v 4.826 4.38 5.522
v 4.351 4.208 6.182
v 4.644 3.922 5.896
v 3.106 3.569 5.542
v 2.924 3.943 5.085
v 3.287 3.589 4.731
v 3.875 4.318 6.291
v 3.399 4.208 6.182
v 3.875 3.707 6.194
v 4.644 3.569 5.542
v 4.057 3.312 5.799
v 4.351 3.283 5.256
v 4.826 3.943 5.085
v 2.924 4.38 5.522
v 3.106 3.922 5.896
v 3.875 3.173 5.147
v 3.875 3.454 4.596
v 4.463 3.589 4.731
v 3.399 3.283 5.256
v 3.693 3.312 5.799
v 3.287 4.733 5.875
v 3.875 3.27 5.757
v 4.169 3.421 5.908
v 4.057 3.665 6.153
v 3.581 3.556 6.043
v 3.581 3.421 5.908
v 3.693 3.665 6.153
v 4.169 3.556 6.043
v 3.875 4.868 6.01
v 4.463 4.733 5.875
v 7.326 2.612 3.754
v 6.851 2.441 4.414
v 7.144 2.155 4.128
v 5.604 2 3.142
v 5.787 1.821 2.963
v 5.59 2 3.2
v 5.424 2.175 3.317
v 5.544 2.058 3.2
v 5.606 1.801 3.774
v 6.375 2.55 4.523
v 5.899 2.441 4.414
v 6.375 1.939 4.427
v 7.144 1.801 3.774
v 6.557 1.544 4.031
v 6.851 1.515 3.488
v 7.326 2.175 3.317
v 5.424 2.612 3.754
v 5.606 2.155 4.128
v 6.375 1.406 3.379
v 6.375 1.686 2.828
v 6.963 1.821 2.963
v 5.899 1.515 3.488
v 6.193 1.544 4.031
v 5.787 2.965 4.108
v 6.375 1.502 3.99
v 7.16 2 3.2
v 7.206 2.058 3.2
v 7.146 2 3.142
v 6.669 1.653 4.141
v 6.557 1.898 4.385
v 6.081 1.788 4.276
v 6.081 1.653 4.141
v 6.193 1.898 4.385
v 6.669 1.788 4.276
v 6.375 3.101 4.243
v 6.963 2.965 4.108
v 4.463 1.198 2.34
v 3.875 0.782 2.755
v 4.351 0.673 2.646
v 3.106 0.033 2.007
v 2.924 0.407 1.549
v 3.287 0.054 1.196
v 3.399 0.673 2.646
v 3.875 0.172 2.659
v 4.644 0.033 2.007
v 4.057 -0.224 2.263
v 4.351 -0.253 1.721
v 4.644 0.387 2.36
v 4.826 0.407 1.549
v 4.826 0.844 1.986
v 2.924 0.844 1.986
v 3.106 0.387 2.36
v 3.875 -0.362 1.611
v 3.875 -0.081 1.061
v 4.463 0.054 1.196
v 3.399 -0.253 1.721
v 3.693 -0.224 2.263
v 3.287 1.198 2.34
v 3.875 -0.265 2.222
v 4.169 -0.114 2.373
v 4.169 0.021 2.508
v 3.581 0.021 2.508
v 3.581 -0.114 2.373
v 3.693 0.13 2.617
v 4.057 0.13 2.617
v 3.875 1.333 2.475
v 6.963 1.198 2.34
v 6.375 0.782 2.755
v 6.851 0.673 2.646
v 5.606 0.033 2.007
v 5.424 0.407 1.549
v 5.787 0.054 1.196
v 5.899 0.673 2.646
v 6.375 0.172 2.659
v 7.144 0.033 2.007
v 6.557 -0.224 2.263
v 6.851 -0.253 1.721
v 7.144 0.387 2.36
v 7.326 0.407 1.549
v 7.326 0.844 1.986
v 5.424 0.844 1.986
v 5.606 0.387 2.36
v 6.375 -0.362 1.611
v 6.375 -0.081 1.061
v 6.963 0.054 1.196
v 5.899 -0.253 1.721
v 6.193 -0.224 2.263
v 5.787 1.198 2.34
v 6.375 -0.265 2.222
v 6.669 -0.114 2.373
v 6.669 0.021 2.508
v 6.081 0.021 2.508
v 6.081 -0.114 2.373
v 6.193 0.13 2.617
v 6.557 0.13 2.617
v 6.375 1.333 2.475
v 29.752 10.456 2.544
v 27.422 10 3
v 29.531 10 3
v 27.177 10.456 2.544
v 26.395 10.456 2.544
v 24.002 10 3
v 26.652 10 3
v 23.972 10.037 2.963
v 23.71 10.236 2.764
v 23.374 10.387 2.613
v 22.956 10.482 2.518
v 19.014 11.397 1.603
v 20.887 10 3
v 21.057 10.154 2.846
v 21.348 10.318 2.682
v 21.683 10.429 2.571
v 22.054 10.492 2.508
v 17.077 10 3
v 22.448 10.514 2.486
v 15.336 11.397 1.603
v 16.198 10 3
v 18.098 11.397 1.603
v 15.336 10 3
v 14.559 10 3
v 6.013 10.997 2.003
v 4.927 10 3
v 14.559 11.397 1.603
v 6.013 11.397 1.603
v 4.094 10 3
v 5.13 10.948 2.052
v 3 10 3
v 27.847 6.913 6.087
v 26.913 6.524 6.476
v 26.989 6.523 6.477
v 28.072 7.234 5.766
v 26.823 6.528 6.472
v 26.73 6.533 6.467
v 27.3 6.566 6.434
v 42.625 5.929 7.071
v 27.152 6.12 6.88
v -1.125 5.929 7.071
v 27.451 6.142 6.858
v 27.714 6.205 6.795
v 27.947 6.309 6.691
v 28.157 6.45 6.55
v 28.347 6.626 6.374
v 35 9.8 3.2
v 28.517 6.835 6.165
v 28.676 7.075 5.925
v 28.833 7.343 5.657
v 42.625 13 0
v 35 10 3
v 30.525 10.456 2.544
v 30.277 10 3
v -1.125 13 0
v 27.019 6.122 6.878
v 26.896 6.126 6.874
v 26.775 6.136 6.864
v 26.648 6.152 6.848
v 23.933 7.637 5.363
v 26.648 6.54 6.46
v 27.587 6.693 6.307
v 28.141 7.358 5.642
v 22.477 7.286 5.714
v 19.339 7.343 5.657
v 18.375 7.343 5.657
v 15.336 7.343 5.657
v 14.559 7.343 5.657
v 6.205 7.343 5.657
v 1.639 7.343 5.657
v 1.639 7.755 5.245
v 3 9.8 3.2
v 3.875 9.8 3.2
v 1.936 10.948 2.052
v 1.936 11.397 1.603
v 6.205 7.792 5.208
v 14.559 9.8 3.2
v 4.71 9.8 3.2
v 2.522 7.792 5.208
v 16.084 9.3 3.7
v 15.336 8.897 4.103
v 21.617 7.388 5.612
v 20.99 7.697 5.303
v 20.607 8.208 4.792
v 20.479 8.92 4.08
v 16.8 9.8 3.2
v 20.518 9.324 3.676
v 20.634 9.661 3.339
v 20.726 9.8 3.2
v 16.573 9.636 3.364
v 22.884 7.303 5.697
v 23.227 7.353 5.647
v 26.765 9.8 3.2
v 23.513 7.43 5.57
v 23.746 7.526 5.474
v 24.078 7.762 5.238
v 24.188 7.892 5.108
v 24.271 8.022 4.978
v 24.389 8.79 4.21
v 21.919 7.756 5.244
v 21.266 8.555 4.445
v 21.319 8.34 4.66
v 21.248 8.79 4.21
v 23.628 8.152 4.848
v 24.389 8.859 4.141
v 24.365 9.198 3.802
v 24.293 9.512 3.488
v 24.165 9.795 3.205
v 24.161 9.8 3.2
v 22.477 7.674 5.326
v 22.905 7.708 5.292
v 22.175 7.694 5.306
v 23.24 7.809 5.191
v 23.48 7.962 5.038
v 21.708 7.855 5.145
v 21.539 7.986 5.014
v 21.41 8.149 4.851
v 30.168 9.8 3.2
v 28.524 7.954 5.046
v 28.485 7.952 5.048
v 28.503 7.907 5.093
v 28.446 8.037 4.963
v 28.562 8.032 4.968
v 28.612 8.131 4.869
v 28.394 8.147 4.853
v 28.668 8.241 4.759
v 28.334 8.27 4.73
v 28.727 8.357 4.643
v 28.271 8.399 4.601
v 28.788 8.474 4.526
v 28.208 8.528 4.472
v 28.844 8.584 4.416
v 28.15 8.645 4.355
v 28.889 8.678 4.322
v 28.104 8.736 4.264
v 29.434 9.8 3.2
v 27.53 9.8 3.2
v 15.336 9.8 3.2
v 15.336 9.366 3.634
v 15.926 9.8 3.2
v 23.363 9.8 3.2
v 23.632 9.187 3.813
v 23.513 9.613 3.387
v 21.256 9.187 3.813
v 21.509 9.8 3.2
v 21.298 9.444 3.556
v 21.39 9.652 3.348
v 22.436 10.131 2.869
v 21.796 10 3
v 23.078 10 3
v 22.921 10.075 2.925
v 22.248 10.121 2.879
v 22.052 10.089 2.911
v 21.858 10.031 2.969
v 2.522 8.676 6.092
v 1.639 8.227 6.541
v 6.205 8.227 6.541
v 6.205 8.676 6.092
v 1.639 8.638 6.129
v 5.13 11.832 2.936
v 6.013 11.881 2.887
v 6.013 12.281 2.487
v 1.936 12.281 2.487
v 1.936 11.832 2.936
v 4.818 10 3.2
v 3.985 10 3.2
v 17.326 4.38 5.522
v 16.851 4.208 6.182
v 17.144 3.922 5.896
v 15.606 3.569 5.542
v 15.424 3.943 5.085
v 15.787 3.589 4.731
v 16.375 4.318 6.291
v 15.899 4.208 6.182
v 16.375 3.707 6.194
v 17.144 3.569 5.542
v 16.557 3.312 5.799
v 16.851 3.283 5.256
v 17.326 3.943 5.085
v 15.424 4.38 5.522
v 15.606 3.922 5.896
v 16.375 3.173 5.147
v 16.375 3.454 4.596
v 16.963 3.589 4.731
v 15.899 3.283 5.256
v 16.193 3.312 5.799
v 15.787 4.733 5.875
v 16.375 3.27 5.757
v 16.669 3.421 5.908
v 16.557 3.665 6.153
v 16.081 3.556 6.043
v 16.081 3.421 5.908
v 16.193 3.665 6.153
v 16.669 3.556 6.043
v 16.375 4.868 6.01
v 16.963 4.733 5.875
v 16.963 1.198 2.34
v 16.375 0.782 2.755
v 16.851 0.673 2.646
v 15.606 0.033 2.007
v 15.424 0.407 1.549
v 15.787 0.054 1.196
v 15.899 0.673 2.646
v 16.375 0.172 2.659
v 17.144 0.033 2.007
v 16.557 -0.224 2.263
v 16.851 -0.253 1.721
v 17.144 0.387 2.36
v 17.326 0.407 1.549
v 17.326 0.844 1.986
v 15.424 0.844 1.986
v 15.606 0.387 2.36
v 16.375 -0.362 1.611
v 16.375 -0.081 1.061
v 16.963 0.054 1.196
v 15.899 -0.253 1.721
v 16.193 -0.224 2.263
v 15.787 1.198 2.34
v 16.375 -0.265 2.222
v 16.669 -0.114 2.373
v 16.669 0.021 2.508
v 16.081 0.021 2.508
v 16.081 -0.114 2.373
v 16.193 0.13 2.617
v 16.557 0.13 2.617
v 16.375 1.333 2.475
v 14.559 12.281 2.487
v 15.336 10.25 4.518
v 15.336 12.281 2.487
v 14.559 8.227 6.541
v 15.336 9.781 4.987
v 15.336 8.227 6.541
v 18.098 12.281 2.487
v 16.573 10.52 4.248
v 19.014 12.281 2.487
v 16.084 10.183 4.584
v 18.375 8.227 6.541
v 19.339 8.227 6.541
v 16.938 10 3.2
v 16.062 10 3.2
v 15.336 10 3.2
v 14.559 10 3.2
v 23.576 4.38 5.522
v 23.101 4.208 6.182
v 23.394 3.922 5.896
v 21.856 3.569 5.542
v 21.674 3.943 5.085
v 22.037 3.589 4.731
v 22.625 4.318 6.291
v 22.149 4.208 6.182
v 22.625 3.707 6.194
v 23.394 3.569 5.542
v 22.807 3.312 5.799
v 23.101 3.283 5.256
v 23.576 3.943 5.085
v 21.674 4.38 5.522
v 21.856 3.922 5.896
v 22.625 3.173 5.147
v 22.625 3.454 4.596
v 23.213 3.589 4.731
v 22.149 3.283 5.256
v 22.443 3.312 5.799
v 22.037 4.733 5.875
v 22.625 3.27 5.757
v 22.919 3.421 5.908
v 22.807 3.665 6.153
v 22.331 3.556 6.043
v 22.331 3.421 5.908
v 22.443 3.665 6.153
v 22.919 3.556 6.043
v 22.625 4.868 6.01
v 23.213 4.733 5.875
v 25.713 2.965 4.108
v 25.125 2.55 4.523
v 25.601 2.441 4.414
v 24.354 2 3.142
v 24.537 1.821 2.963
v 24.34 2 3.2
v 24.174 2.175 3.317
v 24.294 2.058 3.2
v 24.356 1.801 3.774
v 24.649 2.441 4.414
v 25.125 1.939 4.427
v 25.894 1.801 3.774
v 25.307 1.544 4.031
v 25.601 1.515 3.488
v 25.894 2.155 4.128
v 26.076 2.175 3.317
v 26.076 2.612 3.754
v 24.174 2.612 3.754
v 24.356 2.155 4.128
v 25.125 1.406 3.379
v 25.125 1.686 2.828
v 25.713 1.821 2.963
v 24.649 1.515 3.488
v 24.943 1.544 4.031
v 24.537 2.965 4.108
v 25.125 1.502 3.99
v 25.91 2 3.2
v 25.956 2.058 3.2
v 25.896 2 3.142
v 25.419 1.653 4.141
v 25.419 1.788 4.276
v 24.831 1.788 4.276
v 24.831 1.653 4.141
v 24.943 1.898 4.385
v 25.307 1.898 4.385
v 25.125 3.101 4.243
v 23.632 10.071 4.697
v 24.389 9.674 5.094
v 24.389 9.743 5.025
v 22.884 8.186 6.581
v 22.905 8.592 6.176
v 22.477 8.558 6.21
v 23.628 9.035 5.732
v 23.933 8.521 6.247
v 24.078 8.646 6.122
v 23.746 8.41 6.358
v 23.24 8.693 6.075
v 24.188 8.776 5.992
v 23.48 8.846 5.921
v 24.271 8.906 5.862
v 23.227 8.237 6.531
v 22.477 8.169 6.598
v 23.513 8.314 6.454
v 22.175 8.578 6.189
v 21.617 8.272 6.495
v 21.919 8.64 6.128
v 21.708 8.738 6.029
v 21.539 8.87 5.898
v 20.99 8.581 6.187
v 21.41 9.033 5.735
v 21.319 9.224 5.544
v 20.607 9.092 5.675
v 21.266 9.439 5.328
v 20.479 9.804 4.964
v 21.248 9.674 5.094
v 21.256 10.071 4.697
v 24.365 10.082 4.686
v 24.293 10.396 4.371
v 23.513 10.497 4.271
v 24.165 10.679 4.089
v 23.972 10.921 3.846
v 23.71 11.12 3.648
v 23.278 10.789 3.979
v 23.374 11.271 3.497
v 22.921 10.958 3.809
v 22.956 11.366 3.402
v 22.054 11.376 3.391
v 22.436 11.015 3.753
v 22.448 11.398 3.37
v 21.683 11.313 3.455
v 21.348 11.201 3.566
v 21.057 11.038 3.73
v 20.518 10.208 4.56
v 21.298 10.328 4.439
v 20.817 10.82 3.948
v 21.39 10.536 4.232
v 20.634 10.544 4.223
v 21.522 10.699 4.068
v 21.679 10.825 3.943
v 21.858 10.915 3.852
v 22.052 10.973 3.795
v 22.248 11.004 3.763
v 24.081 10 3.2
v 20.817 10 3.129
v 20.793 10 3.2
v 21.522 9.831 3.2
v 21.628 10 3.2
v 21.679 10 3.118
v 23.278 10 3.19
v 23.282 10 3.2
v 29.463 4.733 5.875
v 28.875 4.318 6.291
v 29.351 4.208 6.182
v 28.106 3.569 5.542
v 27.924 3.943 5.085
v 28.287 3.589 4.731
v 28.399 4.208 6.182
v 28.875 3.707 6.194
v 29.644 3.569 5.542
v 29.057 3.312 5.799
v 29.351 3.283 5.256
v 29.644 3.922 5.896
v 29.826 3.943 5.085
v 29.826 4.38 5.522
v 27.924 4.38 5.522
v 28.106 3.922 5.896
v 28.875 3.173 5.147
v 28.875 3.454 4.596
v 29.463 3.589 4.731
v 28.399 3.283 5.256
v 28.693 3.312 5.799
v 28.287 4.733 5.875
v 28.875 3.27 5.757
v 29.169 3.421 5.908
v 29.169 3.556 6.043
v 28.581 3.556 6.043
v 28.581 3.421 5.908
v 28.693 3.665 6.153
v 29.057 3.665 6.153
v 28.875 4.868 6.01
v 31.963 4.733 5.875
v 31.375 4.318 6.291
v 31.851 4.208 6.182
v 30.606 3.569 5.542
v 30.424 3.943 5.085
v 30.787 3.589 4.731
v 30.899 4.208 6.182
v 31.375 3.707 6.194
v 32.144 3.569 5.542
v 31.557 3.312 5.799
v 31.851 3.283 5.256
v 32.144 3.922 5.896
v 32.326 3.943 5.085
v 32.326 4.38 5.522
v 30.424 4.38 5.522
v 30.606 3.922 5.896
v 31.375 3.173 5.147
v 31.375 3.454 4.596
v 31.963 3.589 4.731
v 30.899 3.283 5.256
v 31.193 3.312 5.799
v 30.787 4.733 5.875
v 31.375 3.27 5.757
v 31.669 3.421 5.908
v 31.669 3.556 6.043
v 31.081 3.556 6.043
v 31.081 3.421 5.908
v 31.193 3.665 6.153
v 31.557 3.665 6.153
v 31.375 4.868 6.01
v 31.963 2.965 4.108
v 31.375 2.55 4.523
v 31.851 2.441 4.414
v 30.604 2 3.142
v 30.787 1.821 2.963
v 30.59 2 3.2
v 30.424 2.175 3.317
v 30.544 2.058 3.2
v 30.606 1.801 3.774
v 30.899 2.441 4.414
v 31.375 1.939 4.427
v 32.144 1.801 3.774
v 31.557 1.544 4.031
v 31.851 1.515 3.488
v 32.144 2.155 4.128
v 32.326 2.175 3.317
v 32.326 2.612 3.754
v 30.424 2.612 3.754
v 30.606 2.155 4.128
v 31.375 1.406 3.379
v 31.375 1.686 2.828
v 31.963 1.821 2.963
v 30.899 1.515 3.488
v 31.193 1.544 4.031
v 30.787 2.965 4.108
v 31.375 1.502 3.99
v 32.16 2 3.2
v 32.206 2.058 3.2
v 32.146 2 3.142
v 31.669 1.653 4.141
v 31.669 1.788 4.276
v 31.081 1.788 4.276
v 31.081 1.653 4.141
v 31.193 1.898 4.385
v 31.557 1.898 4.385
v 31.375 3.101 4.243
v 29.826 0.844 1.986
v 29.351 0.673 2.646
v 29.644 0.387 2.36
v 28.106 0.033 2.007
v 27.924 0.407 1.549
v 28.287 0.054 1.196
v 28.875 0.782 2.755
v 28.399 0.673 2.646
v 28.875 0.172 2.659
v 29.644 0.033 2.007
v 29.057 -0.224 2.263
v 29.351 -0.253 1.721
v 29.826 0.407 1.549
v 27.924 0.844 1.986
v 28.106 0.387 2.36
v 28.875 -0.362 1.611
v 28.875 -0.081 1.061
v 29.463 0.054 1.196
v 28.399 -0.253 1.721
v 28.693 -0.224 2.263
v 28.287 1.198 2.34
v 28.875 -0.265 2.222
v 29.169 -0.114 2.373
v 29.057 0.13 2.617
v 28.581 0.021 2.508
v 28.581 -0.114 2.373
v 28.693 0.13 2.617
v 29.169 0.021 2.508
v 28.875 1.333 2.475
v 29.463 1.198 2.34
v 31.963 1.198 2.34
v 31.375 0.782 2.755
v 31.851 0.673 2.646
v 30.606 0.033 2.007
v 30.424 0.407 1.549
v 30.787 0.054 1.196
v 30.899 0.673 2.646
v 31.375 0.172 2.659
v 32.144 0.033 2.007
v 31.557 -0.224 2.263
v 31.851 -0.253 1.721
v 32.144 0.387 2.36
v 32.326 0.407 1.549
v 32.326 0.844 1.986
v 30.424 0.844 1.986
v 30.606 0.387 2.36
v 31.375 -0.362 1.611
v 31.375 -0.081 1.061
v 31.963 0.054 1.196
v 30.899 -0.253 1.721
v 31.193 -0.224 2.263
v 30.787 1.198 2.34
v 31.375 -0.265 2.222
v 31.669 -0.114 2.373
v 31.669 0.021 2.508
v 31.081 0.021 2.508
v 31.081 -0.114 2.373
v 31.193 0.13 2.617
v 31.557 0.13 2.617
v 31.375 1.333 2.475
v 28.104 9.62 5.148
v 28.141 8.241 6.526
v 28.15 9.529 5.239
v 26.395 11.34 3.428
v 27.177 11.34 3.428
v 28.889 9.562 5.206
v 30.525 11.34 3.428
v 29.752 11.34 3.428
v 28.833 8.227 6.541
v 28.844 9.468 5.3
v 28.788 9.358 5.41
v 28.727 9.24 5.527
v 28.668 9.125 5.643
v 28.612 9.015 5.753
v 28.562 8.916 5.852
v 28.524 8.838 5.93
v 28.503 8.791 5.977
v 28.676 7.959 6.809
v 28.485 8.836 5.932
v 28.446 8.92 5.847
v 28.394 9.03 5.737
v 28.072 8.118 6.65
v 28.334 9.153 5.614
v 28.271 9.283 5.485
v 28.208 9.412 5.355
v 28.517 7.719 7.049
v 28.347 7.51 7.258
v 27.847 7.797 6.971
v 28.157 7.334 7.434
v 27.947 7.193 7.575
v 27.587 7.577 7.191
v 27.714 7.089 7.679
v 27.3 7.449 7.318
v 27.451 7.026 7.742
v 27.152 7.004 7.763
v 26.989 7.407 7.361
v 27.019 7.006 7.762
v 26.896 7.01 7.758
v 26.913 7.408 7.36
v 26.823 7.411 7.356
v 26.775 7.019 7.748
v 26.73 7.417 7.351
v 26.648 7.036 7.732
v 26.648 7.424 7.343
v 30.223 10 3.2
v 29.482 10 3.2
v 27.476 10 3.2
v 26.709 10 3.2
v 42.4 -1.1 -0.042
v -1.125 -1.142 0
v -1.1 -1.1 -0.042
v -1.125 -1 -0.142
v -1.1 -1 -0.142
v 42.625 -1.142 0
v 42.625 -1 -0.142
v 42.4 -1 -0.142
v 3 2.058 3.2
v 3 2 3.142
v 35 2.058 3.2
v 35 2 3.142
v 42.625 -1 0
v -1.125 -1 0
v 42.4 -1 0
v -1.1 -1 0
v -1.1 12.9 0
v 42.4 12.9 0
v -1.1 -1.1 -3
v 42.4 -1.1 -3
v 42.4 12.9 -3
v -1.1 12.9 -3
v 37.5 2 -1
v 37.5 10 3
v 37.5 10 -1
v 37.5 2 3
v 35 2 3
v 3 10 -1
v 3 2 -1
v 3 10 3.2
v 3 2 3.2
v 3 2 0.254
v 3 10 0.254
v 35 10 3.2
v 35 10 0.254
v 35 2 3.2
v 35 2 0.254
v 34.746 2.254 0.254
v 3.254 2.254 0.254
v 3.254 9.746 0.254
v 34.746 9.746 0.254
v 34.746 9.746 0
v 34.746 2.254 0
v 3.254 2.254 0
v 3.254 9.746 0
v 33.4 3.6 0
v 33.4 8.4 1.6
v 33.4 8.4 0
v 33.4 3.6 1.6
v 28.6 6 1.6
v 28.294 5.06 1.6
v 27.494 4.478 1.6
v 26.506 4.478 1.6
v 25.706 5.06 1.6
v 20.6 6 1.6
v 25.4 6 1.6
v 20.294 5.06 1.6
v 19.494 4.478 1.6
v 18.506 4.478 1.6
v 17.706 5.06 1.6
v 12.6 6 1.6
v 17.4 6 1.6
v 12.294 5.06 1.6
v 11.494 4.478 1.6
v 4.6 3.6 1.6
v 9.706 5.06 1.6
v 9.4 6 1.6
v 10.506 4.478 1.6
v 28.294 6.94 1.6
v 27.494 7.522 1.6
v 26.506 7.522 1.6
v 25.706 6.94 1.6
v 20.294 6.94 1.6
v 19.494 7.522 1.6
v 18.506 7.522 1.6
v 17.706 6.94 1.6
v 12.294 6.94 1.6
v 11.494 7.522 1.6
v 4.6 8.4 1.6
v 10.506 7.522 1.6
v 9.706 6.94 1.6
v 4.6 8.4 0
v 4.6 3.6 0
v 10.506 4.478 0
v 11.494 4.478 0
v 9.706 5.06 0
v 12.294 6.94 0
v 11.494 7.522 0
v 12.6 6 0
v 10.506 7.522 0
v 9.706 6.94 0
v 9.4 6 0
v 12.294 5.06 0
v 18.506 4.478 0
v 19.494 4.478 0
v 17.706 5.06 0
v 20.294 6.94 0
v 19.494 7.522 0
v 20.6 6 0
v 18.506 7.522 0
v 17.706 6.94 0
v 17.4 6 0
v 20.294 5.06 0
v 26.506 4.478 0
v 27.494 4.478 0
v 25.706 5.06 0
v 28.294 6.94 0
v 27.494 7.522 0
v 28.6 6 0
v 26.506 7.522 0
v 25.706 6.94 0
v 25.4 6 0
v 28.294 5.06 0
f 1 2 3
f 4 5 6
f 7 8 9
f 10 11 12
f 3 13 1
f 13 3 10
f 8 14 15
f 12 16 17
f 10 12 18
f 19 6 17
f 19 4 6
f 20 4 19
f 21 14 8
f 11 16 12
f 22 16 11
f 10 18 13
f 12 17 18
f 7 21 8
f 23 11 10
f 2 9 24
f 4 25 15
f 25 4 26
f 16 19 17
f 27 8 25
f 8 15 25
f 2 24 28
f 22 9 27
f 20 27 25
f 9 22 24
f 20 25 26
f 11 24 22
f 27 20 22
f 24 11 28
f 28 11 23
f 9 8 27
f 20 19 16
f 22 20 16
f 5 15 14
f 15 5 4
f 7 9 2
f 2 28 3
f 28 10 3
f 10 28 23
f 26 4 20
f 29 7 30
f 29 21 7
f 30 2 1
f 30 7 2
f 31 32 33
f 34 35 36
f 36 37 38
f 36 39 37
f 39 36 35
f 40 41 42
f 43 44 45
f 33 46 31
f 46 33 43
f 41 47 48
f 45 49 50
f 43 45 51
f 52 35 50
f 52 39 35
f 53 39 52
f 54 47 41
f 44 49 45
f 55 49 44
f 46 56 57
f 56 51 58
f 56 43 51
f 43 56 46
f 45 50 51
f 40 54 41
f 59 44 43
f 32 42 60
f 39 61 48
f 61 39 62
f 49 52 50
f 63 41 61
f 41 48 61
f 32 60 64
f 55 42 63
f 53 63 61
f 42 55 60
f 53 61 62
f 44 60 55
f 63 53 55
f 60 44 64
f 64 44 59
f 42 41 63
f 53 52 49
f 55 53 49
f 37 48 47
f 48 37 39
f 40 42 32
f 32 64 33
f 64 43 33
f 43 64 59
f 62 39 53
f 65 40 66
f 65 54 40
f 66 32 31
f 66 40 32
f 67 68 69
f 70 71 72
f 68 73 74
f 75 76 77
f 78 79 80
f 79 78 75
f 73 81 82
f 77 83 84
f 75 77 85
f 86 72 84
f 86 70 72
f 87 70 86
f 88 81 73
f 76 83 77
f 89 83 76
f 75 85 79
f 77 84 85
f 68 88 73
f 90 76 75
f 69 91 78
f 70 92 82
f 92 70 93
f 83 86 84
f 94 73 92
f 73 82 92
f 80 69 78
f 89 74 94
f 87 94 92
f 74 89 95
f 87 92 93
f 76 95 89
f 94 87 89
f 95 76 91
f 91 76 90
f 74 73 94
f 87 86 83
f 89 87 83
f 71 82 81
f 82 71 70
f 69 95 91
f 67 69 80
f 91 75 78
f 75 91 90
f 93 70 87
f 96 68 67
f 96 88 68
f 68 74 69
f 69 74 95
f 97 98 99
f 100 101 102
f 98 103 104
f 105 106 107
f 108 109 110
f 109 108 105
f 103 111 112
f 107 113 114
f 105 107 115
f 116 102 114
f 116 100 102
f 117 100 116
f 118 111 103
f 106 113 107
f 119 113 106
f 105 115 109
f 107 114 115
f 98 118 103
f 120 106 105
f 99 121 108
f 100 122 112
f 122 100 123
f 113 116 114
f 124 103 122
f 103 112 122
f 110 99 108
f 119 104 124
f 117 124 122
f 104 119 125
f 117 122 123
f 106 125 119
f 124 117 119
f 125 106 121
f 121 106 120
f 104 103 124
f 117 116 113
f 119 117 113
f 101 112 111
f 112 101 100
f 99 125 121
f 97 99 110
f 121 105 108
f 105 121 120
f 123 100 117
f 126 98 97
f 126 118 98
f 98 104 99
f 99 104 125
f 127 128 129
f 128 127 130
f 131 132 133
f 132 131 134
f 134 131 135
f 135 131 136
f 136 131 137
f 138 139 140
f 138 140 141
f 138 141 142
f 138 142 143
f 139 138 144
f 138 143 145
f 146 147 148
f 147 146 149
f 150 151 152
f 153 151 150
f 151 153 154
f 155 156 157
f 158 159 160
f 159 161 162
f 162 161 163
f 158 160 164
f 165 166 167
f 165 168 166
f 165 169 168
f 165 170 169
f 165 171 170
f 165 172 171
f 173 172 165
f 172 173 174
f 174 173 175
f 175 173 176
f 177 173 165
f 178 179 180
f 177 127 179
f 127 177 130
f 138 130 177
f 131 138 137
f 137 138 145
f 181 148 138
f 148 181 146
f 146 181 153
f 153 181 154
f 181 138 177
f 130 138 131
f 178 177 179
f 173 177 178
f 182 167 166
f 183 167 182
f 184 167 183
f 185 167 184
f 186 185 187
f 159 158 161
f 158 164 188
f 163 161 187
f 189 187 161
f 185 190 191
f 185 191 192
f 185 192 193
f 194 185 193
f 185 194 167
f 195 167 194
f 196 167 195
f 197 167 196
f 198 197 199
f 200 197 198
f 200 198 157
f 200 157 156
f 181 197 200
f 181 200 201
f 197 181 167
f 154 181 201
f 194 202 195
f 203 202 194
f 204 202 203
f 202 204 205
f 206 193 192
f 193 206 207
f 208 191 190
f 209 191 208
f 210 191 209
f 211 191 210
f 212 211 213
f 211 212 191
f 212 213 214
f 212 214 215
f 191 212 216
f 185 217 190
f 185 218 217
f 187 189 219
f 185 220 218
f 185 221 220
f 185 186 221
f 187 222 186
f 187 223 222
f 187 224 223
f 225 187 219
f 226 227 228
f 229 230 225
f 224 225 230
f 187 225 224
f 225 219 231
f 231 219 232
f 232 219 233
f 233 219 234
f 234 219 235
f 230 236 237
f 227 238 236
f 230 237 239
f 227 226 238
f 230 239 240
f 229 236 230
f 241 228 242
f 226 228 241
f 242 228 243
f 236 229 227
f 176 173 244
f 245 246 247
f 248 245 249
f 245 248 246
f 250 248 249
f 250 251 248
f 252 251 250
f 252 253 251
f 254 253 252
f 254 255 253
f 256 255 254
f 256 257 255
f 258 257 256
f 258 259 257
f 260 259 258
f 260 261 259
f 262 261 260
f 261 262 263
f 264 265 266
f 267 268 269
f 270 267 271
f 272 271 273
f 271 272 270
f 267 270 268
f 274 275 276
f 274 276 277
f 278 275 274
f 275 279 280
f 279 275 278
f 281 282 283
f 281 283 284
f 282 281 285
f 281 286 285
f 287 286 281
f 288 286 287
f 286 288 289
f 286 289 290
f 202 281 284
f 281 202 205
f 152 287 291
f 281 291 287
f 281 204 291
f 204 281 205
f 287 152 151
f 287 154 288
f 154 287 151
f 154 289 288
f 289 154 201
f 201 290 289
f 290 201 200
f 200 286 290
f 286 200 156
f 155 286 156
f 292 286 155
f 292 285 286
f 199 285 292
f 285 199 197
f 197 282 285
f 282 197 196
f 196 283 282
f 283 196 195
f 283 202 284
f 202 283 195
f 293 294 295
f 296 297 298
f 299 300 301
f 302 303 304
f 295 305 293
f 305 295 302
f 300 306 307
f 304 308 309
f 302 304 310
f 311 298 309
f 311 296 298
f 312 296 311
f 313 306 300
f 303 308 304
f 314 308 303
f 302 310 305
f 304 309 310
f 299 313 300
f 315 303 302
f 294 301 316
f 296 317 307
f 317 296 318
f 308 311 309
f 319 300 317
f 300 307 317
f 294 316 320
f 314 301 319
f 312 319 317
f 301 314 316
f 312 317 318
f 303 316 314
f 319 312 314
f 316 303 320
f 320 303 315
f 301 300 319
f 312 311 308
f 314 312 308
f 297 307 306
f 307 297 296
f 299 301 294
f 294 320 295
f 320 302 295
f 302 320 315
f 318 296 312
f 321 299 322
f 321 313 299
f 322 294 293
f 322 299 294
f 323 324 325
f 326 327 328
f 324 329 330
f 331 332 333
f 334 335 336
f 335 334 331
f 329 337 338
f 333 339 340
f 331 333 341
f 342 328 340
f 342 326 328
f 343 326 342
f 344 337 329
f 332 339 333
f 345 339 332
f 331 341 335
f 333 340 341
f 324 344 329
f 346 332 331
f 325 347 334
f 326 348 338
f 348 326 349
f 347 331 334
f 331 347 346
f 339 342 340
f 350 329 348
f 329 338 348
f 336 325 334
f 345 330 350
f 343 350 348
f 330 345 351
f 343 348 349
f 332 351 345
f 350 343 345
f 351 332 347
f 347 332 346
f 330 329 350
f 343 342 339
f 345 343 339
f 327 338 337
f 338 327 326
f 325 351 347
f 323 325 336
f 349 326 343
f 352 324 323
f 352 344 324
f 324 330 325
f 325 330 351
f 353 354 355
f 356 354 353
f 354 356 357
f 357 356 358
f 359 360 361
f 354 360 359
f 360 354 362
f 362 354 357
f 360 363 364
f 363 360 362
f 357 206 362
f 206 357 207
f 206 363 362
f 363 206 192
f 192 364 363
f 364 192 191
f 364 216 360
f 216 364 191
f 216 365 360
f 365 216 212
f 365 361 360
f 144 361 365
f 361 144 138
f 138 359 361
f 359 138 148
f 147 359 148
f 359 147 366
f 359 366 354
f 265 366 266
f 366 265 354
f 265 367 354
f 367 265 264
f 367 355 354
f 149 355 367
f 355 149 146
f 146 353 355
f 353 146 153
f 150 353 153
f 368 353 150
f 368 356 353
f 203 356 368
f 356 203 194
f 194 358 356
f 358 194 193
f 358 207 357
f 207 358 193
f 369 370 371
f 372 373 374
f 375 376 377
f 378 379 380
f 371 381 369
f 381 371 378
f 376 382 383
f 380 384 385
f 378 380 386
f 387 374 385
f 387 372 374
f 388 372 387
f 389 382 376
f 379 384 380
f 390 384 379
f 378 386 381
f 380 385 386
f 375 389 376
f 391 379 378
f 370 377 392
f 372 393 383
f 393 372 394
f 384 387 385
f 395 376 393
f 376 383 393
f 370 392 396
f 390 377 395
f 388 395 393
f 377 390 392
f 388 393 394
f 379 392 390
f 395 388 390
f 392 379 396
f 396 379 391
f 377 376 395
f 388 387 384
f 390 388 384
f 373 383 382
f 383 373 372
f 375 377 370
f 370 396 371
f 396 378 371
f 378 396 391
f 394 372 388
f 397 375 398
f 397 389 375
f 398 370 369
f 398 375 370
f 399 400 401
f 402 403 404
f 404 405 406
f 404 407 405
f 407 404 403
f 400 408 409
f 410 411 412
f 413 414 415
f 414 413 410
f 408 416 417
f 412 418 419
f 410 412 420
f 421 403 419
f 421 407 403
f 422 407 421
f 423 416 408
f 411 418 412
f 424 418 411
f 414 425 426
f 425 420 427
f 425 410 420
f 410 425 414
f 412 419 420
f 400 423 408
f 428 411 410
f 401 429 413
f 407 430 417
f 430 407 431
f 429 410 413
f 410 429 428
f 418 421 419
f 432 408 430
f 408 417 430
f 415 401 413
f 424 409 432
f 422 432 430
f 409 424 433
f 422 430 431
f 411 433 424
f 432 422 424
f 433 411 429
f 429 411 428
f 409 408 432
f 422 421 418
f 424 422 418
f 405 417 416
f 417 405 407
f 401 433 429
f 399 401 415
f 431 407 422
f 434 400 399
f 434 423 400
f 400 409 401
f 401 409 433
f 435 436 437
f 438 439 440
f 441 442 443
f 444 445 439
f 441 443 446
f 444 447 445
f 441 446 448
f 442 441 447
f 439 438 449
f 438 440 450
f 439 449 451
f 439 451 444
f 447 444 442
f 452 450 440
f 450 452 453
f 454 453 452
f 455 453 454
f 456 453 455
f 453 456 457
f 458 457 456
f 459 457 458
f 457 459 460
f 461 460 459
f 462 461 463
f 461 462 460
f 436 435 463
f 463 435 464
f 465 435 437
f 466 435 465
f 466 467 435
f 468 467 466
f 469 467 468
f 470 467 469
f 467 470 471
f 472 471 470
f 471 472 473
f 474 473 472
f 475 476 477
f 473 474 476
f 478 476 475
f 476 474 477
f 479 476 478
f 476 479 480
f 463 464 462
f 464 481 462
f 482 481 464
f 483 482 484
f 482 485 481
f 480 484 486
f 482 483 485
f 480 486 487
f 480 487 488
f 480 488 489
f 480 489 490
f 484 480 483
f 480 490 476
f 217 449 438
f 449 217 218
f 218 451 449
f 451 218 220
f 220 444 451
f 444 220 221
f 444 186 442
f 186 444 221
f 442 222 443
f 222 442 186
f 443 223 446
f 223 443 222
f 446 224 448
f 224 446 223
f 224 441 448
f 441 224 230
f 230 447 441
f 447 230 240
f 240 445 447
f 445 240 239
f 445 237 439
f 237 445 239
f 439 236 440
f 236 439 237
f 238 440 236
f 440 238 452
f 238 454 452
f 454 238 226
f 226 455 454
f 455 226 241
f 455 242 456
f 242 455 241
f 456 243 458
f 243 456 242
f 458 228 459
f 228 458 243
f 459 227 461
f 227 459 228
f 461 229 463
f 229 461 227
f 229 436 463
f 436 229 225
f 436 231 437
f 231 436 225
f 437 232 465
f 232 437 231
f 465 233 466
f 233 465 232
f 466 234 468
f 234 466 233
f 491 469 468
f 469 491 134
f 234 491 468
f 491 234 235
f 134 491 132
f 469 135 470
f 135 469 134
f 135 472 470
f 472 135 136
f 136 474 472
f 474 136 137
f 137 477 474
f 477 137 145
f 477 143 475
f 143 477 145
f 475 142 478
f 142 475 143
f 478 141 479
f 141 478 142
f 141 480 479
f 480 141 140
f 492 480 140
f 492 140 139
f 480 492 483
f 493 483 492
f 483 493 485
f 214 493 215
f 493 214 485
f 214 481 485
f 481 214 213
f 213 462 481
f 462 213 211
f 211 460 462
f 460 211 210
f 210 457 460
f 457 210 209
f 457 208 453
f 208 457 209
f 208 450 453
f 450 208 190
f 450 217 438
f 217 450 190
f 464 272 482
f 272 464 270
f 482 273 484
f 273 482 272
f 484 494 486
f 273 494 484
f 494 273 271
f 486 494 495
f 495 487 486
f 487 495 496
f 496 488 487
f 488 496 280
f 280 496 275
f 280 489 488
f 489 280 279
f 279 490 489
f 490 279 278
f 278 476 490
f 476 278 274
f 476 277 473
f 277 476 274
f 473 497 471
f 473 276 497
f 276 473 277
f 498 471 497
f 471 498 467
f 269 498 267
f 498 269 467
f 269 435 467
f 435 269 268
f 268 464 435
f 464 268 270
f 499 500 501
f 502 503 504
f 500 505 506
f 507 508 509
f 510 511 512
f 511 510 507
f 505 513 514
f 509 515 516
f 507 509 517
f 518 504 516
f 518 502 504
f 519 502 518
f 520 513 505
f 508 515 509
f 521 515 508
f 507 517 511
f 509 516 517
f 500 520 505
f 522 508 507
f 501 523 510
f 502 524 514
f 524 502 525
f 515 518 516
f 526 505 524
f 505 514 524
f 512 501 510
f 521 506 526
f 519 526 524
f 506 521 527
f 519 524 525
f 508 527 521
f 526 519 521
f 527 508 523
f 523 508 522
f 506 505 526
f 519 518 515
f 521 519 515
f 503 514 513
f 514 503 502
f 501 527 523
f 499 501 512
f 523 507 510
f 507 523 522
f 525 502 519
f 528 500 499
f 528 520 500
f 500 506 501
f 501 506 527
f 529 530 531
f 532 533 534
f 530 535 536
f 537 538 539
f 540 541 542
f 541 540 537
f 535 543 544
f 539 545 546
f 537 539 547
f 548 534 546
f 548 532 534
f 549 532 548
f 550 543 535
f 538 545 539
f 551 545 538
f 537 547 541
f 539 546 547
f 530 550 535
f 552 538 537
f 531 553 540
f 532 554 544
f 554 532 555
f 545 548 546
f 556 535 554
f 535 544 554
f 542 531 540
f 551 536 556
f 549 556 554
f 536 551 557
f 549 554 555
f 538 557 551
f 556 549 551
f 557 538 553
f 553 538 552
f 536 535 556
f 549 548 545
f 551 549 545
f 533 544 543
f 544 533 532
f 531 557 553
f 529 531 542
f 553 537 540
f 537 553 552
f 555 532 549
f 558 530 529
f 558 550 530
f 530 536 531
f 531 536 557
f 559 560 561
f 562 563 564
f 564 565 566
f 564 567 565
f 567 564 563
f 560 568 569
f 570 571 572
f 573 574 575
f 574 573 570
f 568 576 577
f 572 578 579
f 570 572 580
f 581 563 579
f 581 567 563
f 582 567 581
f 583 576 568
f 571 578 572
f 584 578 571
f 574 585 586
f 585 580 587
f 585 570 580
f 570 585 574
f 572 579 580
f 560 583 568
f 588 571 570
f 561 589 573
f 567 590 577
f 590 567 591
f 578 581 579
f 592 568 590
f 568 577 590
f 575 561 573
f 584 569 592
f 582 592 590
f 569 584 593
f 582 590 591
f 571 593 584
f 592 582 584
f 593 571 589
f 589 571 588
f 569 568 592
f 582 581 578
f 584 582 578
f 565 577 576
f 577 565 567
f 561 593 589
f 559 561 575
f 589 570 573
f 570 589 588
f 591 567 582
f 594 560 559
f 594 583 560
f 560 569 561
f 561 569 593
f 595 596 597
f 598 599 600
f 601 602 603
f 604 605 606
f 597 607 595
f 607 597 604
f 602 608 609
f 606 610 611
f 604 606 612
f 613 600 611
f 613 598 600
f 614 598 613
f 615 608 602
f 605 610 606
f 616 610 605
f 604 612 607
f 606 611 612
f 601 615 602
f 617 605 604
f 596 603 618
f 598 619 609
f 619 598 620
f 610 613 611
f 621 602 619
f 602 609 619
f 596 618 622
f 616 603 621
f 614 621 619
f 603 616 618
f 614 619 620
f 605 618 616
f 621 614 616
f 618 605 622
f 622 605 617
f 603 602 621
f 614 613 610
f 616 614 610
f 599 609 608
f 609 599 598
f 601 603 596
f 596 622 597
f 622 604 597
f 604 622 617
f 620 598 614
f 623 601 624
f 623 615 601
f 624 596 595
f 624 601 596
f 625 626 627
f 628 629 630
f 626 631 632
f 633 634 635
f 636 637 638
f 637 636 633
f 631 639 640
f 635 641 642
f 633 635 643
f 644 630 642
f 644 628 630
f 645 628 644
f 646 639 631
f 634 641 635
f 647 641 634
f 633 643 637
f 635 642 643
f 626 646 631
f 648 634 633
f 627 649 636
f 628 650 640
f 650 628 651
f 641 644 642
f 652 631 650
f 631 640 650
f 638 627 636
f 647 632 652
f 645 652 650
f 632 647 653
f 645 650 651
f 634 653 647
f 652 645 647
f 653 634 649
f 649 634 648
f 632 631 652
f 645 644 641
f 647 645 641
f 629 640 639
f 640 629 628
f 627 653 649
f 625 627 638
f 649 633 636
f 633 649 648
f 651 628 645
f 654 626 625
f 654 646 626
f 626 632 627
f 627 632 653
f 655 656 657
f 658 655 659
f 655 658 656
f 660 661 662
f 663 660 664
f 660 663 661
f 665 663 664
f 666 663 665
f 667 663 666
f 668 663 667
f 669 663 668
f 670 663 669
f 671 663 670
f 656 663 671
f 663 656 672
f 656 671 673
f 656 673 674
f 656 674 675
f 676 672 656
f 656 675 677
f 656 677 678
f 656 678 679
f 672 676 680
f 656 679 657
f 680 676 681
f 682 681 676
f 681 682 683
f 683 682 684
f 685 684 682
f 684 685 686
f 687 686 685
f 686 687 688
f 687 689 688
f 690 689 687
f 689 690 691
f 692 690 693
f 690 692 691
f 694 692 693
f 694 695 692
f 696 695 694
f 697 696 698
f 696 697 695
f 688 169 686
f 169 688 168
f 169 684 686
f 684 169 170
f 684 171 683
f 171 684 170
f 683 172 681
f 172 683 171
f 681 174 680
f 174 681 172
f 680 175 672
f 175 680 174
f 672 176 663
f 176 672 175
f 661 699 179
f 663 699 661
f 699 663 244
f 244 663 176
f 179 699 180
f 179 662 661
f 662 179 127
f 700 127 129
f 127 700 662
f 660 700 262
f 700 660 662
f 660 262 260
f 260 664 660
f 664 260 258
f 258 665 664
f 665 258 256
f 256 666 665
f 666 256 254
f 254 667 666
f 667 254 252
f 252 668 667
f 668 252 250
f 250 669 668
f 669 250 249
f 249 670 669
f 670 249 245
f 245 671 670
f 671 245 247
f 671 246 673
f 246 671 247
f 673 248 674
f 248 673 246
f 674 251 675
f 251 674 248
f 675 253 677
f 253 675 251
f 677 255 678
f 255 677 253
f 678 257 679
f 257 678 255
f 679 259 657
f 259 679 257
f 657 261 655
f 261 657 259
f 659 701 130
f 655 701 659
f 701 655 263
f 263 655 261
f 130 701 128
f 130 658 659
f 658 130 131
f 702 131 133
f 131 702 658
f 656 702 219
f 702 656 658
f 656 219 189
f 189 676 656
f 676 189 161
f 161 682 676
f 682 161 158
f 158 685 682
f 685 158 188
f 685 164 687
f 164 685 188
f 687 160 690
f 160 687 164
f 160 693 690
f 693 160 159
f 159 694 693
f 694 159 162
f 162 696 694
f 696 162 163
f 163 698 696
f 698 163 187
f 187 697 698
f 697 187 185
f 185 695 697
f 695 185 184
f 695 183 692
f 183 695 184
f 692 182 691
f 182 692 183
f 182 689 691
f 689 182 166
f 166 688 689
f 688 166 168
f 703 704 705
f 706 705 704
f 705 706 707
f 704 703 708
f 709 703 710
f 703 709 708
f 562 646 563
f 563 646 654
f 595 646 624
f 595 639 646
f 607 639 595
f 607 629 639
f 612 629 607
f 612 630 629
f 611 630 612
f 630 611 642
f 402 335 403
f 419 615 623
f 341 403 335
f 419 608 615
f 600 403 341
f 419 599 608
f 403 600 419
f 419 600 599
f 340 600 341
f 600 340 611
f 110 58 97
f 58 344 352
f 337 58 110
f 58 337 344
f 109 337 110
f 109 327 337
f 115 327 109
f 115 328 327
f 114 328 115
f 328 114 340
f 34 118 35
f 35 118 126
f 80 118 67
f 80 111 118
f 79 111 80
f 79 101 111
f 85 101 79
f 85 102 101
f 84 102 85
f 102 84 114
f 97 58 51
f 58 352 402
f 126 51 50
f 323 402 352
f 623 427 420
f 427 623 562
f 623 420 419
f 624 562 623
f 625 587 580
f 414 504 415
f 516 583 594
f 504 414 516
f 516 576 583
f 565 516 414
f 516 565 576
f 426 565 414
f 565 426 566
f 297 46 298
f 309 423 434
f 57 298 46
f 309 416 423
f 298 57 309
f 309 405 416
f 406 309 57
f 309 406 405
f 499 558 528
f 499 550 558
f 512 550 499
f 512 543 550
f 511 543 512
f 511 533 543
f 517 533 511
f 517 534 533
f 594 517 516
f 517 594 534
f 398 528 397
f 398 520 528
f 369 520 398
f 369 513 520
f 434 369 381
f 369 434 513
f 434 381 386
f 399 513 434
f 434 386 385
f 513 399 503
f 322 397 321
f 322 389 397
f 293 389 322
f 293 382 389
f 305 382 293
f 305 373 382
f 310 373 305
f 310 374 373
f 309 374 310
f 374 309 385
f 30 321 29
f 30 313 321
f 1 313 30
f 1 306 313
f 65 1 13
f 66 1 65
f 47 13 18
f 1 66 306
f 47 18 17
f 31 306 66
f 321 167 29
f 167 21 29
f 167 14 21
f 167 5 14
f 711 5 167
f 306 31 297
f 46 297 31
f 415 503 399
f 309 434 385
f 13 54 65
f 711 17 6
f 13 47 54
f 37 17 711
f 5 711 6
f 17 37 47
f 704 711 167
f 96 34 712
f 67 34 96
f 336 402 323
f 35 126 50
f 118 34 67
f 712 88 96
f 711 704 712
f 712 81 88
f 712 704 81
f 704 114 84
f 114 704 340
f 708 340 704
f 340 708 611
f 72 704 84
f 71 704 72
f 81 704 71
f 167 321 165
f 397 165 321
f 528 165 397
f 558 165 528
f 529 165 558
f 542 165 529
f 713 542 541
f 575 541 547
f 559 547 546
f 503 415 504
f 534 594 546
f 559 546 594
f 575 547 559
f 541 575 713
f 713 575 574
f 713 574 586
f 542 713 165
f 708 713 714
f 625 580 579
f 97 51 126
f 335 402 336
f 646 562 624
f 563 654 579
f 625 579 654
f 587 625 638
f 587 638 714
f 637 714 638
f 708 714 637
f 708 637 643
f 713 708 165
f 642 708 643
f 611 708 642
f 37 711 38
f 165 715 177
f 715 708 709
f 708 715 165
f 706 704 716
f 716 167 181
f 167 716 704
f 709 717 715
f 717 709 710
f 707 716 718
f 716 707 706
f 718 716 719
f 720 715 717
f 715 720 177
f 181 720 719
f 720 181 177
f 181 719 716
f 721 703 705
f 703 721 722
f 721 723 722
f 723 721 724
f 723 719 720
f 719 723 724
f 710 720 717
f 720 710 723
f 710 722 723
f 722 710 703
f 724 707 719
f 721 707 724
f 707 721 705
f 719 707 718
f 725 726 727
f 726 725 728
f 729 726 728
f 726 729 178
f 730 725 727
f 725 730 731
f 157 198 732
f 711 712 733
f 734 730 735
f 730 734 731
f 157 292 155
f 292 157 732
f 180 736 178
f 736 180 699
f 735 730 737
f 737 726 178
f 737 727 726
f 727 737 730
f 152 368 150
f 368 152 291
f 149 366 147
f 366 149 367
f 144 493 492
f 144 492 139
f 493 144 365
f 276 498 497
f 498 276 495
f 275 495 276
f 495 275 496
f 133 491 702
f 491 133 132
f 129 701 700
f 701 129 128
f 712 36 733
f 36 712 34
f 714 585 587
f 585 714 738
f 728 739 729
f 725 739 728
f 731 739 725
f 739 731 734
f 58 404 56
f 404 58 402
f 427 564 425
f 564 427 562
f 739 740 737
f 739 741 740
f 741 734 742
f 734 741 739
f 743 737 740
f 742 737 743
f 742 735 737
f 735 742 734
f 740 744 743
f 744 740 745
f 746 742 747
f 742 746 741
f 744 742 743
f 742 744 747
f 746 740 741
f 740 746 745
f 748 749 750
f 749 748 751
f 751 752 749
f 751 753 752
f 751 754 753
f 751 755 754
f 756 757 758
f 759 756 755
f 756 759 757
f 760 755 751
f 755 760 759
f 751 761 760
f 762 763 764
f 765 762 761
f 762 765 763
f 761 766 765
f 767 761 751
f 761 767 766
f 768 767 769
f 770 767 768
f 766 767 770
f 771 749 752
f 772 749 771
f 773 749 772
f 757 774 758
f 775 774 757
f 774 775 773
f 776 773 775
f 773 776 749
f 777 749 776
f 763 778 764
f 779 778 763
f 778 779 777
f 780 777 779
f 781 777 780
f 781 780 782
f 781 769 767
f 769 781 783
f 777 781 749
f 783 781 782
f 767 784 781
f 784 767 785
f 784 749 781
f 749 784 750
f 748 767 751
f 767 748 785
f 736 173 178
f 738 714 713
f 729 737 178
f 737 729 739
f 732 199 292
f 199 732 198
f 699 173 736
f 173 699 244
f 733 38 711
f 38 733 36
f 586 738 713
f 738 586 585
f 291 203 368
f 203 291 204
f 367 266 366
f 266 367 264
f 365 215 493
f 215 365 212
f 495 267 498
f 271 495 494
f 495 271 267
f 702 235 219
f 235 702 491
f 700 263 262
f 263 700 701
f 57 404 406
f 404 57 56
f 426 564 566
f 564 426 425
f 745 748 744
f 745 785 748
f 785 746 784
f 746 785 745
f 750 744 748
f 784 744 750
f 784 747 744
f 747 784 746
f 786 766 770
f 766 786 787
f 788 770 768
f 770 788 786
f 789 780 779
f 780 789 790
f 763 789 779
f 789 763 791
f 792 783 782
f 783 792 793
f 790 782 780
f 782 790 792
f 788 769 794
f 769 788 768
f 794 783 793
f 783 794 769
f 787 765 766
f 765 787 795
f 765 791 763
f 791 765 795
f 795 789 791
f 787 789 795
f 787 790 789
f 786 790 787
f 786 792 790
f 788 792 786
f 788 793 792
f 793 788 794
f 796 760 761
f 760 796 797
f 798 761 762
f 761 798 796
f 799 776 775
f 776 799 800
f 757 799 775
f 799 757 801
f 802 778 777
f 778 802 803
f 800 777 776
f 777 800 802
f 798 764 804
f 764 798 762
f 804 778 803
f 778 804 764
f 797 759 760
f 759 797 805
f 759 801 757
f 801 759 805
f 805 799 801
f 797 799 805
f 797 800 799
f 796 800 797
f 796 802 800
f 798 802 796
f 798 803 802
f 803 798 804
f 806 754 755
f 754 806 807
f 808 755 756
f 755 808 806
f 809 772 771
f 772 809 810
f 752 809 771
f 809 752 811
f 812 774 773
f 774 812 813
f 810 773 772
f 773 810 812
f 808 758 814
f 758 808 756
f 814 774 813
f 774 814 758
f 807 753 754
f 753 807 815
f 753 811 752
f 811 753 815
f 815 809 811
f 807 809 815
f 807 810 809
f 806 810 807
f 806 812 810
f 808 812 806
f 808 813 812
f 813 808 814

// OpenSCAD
// file: ../OpenSCAD/brailleAndText.scad
/*
Braille Module
http://creativecommons.org/licenses/by/3.0/
*/


// mm sizes from http://dots.physics.orst.edu/gs_layout.html
radius = 0.25;
spacing = 2.5;
startOffset = 3.75;
distance = startOffset + spacing;

plate_height = 10;
plate_thickness = 10;   // was 2.

$fn = 10;



module letter(bitmap, char) {
//    echo(char);
	row_size = 2;
	col_size = 3;
	bitmap_size = row_size * col_size;
	
	function loc_x(loc) = floor(loc / row_size) * spacing + spacing;
	function loc_y(loc) = loc % row_size * spacing  + (distance-spacing)/2;

    translate([0, loc_y(-1), -2]) {
        rotate([270, 0, 90]) {
            linear_extrude(height = 1.25)
            text(char, 6);
        }
    }
	
    for (loc = [0:bitmap_size - 1]) {
		if (bitmap[loc] != 0) {
			union() {
				translate(v = [loc_x(loc), loc_y(loc), 0]) {
					sphere(radius = radius* bitmap[loc], center = true);
				}
			}
		}
	}
}


module braille_char(char) {
	if (char == "A" || char == "a") {
		letter([
			1,0,
			0,0,
			0,0
		], char);
	} else if (char == "B" || char == "b") {
		letter([
			1,0,
			1,0,
			0,0
		], char);
	} else if (char == "C" || char == "c") {
		letter([
			1,1,
			0,0,
			0,0
		], char);
	} else if (char == "D" || char == "d") {
		letter([
			1,1,
			0,1,
			0,0
		], char);
	} else if (char == "E" || char == "e") {
		letter([
			1,0,
			0,1,
			0,0
		], char);
	} else if (char == "F" || char == "f") {
		letter([
			1,1,
			1,0,
			0,0
		], char);
	} else if (char == "G" || char == "g") {
		letter([
			1,1,
			1,1,
			0,0
		], char);
	} else if (char == "H" || char == "h") {
		letter([
			1,0,
			1,1,
			0,0
		], char);
	} else if (char == "I" || char == "i") {
		letter([
			0,1,
			1,0,
			0,0
		], char);
	} else if (char == "J" || char == "j") {
		letter([
			0,1,
			1,1,
			0,0
		], char);
	} else if (char == "K" || char == "k") {
		letter([
			1,0,
			0,0,
			1,0
		], char);
	} else if (char == "L" || char == "l") {
		letter([
			1,0,
			1,0,
			1,0
		], char);
	} else if (char == "M" || char == "m") {
		letter([
			1,1,
			0,0,
			1,0
		], char);
	} else if (char == "N" || char == "n") {
		letter([
			1,1,
			0,1,
			1,0
		], char);
	} else if (char == "O" || char == "o") {
		letter([
			1,0,
			0,1,
			1,0
		], char);
	} else if (char == "P" || char == "p") {
		letter([
			1,1,
			1,0,
			1,0
		], char);
	} else if (char == "Q" || char == "q") {
		letter([
			1,1,
			1,1,
			1,0
		], char);
	} else if (char == "R" || char == "r") {
		letter([
			1,0,
			1,1,
			1,0
		], char);
	} else if (char == "S" || char == "s") {
		letter([
			0,1,
			1,0,
			1,0
		], char);
	} else if (char == "T" || char == "t") {
		letter([
			0,1,
			1,1,
			1,0
		], char);
	} else if (char == "U" || char == "u") {
		letter([
			1,0,
			0,0,
			1,1
		], char);
	} else if (char == "V" || char == "v") {
		letter([
			1,0,
			1,1,
			1,0
		], char);
	} else if (char == "W" || char == "w") {
		letter([
			0,1,
			1,1,
			0,1
		], char);
	} else if (char == "X" || char == "x") {
		letter([
			1,1,
			0,0,
			1,1
		], char);
	} else if (char == "Y" || char == "y") {
		letter([
			1,1,
			0,1,
			1,1
		], char);
	} else if (char == "Z" || char == "z") {
		letter([
			1,0,
			0,1,
			1,1
		], char);
    } else if (char == " ") {
		letter([
			0,0,
			0,0,
			0,0
		], char);
	} else {
		echo("Invalid Character: ", char);
	}

}

module braille_str(chars) {
    char_count = len(chars);
	echo(str("Total Width of ", chars, " : ",  distance * char_count, "mm"));
	union() {
		for (count = [0:char_count-1]) {
			translate(v = [0, count * distance, plate_thickness]) {
				braille_char(chars[count]);
			}
		}
		translate(v = [0, -distance/2, 0]) {
			color([0,0,1]) {
				cube(size = [plate_height, distance * (char_count+1), plate_thickness]);
			}
            }                                                      
	}
}

function lenText(txt="Hi") = distance * len(txt);

module printTextAndBraille(textToPrint) {
    blockLen = lenText(textToPrint);
    union()
    {
        difference() {                      // remove second box from first
            rotate([0,45,0]) {              // make it on its edge
                braille_str((textToPrint)); // make a long box
            }
            translate([0, -3.25, -8]) {     // move in right place
                cube(size = [14, (blockLen+8), 8]);
            }
        } 
        translate([0.1, -3.1, -3]) {     // move in right place
            cube(size = [14, (blockLen+6), 3]); 
        }
    }                                 
}

printTextAndBraille("HELLO CalLUM");
// file: ../openSCADLibs/lego_brick_builder.scad
/*

 Basic Lego brick builder module for OpenScad by Jorg Janssen 2013 (CC BY-NC 3.0) 
 To use this in your own projects add:

 use <path_to_this_file/lego_brick_builder.scad>
 brick (length, width, height [,smooth]);

 Length and width are in standard lego brick dimensions. 
 Height is in flat brick heights, so for a normal lego brick height = 3.
 Add optional smooth = true for a brick without studs. 
 Use height = 0 to just put studs/knobs on top of other things.

 */
$fn = 150;

// and this is how it's done:

FLU = 1.6; // Fundamental Lego Unit = 1.6 mm

BRICK_WIDTH = 5*FLU; // basic brick width
BRICK_HEIGHT = 6*FLU; // basic brick height
PLATE_HEIGHT = 2*FLU; // basic plate height
WALL_THICKNESS = FLU; // outer wall of the brick
STUD_RADIUS = 1.5*FLU; // studs are the small cylinders on top of the brick with the lego logo ('nopje' in Dutch)
STUD_HEIGHT = FLU; 
ANTI_STUD_RADIUS = 0.5*4.07*FLU;  // an anti stud is the hollow cylinder inside bricks that have length > 1 and width > 1
PIN_RADIUS = FLU; // a pin is the small cylinder inside bricks that have length = 1 or width = 1
SUPPORT_THICKNESS = 0.254; // support is the thin surface between anti studs, pins and walls, your printer might not print this thin, try thicker!
EDGE = 0.254; // this is the width and height of the bottom line edge of smooth bricks
CORRECTION = 0.1; // addition to each size, to make sure all parts connect by moving them a little inside each other

module brick(length = 4, width = 2, height = 3, smooth = false){

	// brick shell
	difference(){
		cube(size = [length*BRICK_WIDTH,width*BRICK_WIDTH,height*PLATE_HEIGHT]);
		translate([WALL_THICKNESS,WALL_THICKNESS,-WALL_THICKNESS])
		union(){
			cube(size = [length*BRICK_WIDTH-2*WALL_THICKNESS,width*BRICK_WIDTH-2*WALL_THICKNESS,height*PLATE_HEIGHT]);
			// stud inner holes, radius = pin radius
			if (!smooth) {
				translate([STUD_RADIUS+WALL_THICKNESS,STUD_RADIUS+WALL_THICKNESS,height*PLATE_HEIGHT])
				for (y = [0:width-1]){
					for (x = [0:length-1]){
						translate ([x*BRICK_WIDTH-WALL_THICKNESS,y*BRICK_WIDTH-WALL_THICKNESS,-CORRECTION])
						cylinder(h=WALL_THICKNESS+2*CORRECTION,r=PIN_RADIUS);
					}
				}
			}
			// small bottom line edge for smooth bricks
			else {
				translate([-WALL_THICKNESS-CORRECTION,-WALL_THICKNESS-CORRECTION,FLU-CORRECTION]) 
				difference() {
					cube([length*BRICK_WIDTH+2*CORRECTION,width*BRICK_WIDTH+2*CORRECTION,EDGE+CORRECTION]);
					translate([EDGE+CORRECTION,EDGE+CORRECTION,-CORRECTION])
					cube([length*BRICK_WIDTH-2*EDGE,width*BRICK_WIDTH-2*EDGE,EDGE+3*CORRECTION]); 
				}
			}
		}
	}
	// Studs
	if(!smooth){
		translate([STUD_RADIUS+WALL_THICKNESS,STUD_RADIUS+WALL_THICKNESS,height*PLATE_HEIGHT])
		for (y = [0:width-1]){
			for (x = [0:length-1]){
				translate ([x*BRICK_WIDTH,y*BRICK_WIDTH,-CORRECTION])
				difference(){
					cylinder(h=STUD_HEIGHT+CORRECTION, r=STUD_RADIUS);
					// Stud inner holes
					translate([0,0,-CORRECTION])
					cylinder(h=0.5*STUD_HEIGHT+CORRECTION,r=PIN_RADIUS);
				}
				// tech logo - disable this if your printer isn't capable of printing this small
				if ( length > width){
					translate([x*BRICK_WIDTH+0.8,y*BRICK_WIDTH-1.9,STUD_HEIGHT-CORRECTION])
					resize([1.2*1.7,2.2*1.7,0.254+CORRECTION])
					rotate(a=[0,0,90])
					import("tech.stl");
				}
				else {
					translate([x*BRICK_WIDTH-1.9,y*BRICK_WIDTH-0.8,STUD_HEIGHT-CORRECTION])
					resize([2.2*1.7,1.2*1.7,0.254+CORRECTION])
					import("tech.stl");				
				}				
				/* 
				// Alternative 2-square logo
				translate ([x*BRICK_WIDTH+CORRECTION,y*BRICK_WIDTH-CORRECTION,STUD_HEIGHT-CORRECTION])		
				cube([1,1,2*CORRECTION]);
				translate ([x*BRICK_WIDTH-0.9,y*BRICK_WIDTH-0.9,STUD_HEIGHT-CORRECTION])		
				cube([1,1,0.3]);
				*/				
			}
		}
	}
	// Pins x
	if (width == 1 && length > 1) {	
			for (x = [1:length-1]){
				translate([x*BRICK_WIDTH,0.5*BRICK_WIDTH,0])
				cylinder(h=height*PLATE_HEIGHT-WALL_THICKNESS+CORRECTION,r=PIN_RADIUS);
				// Supports
				if (height > 1) {
				translate([x*BRICK_WIDTH-0.5*SUPPORT_THICKNESS,CORRECTION,STUD_HEIGHT])
				cube(size=[SUPPORT_THICKNESS,BRICK_WIDTH-2*CORRECTION,height*PLATE_HEIGHT-STUD_HEIGHT-WALL_THICKNESS+CORRECTION]);
			}
		}
	}
	// Pins y
	if (length == 1 && width > 1) {	
			for (y = [1:width-1]){
			translate([0.5*BRICK_WIDTH,y*BRICK_WIDTH,0])
			cylinder(h=height*PLATE_HEIGHT-WALL_THICKNESS+CORRECTION,r=PIN_RADIUS);
			// Supports
			if (height > 1) {
			translate([CORRECTION,y*BRICK_WIDTH-0.5*SUPPORT_THICKNESS,STUD_HEIGHT])
			cube(size=[BRICK_WIDTH-2*CORRECTION,SUPPORT_THICKNESS,height*PLATE_HEIGHT-STUD_HEIGHT-WALL_THICKNESS+CORRECTION]);}
			
		}
	}
	// Anti Studs
	if (width > 1 && length > 1){
		difference(){
			union(){
				for(y = [1:width-1]){
					for(x = [1:length-1]){
						// anti studs
						translate([x*BRICK_WIDTH,y*BRICK_WIDTH,0])
						cylinder (h=height*PLATE_HEIGHT-WALL_THICKNESS+CORRECTION, r = ANTI_STUD_RADIUS);
						// Supports
						if (height > 1){
							// Support x
							if (x%2 == 0 && (length%2 == 0 || length%4 == 1 && x<length/2 || length%4 == 3 && x>length/2) || x%2 == 1 && (length%4 == 3 && x<length/2 || length%4 == 1 && x>length/2)) {
								translate([BRICK_WIDTH*x-0.5*SUPPORT_THICKNESS,y*BRICK_WIDTH-BRICK_WIDTH+WALL_THICKNESS-CORRECTION,STUD_HEIGHT])
								cube(size=[SUPPORT_THICKNESS,2*BRICK_WIDTH-2*WALL_THICKNESS,height*PLATE_HEIGHT-STUD_HEIGHT-WALL_THICKNESS+CORRECTION]);
							}
							// Supports y							
							if (y%2 == 0 && (width%2 == 0 || width%4 == 1 && y<width/2 || width%4 == 3 && y>width/2) || y%2 == 1 && (width%4 == 3 && y<width/2 || width%4 == 1 && y>width/2)) {
								translate([x*BRICK_WIDTH-BRICK_WIDTH+WALL_THICKNESS-CORRECTION,BRICK_WIDTH*y-0.5*SUPPORT_THICKNESS,STUD_HEIGHT])
								cube(size=[2*BRICK_WIDTH-2*WALL_THICKNESS,SUPPORT_THICKNESS,height*PLATE_HEIGHT-STUD_HEIGHT-WALL_THICKNESS+CORRECTION]);
							}
						}
					}
				}
			}
			union(){
				for(y = [1:width-1]){
					for(x = [1:length-1]){
						// hollow anti studs
						translate([x*BRICK_WIDTH,y*BRICK_WIDTH,-WALL_THICKNESS])
						cylinder (h=height*PLATE_HEIGHT, r = STUD_RADIUS);				
					}
				}
			}
		}		
	}
}
	
// file: ../OpenSCAD/TextAndBrailleLegoBlock.scad
 include <../openSCADLibs/lego_brick_builder.scad>
 include <../OpenSCAD/brailleAndText.scad>;

module brickAndText(text) {
    txtLen = distance * len(text);
    echo(distance);
    difference() {
        rotate([180,180,90])
            translate([-13, 2, 0])
                printTextAndBraille(text);
        translate([3, 2, -1]) 
            cube([txtLen - 3, BRICK_WIDTH, 4]);
    }
    translate([3,2,0])
        brick(floor(txtLen / BRICK_WIDTH),1,1, true);    
}

// use <../BPNodesV2/TextNBraille.scad>
//brickAndText("This is a test string");  
// main file
use <../OpenSCAD/TextAndBrailleLegoBlock.scad>

brickAndText("Z-Key ");
